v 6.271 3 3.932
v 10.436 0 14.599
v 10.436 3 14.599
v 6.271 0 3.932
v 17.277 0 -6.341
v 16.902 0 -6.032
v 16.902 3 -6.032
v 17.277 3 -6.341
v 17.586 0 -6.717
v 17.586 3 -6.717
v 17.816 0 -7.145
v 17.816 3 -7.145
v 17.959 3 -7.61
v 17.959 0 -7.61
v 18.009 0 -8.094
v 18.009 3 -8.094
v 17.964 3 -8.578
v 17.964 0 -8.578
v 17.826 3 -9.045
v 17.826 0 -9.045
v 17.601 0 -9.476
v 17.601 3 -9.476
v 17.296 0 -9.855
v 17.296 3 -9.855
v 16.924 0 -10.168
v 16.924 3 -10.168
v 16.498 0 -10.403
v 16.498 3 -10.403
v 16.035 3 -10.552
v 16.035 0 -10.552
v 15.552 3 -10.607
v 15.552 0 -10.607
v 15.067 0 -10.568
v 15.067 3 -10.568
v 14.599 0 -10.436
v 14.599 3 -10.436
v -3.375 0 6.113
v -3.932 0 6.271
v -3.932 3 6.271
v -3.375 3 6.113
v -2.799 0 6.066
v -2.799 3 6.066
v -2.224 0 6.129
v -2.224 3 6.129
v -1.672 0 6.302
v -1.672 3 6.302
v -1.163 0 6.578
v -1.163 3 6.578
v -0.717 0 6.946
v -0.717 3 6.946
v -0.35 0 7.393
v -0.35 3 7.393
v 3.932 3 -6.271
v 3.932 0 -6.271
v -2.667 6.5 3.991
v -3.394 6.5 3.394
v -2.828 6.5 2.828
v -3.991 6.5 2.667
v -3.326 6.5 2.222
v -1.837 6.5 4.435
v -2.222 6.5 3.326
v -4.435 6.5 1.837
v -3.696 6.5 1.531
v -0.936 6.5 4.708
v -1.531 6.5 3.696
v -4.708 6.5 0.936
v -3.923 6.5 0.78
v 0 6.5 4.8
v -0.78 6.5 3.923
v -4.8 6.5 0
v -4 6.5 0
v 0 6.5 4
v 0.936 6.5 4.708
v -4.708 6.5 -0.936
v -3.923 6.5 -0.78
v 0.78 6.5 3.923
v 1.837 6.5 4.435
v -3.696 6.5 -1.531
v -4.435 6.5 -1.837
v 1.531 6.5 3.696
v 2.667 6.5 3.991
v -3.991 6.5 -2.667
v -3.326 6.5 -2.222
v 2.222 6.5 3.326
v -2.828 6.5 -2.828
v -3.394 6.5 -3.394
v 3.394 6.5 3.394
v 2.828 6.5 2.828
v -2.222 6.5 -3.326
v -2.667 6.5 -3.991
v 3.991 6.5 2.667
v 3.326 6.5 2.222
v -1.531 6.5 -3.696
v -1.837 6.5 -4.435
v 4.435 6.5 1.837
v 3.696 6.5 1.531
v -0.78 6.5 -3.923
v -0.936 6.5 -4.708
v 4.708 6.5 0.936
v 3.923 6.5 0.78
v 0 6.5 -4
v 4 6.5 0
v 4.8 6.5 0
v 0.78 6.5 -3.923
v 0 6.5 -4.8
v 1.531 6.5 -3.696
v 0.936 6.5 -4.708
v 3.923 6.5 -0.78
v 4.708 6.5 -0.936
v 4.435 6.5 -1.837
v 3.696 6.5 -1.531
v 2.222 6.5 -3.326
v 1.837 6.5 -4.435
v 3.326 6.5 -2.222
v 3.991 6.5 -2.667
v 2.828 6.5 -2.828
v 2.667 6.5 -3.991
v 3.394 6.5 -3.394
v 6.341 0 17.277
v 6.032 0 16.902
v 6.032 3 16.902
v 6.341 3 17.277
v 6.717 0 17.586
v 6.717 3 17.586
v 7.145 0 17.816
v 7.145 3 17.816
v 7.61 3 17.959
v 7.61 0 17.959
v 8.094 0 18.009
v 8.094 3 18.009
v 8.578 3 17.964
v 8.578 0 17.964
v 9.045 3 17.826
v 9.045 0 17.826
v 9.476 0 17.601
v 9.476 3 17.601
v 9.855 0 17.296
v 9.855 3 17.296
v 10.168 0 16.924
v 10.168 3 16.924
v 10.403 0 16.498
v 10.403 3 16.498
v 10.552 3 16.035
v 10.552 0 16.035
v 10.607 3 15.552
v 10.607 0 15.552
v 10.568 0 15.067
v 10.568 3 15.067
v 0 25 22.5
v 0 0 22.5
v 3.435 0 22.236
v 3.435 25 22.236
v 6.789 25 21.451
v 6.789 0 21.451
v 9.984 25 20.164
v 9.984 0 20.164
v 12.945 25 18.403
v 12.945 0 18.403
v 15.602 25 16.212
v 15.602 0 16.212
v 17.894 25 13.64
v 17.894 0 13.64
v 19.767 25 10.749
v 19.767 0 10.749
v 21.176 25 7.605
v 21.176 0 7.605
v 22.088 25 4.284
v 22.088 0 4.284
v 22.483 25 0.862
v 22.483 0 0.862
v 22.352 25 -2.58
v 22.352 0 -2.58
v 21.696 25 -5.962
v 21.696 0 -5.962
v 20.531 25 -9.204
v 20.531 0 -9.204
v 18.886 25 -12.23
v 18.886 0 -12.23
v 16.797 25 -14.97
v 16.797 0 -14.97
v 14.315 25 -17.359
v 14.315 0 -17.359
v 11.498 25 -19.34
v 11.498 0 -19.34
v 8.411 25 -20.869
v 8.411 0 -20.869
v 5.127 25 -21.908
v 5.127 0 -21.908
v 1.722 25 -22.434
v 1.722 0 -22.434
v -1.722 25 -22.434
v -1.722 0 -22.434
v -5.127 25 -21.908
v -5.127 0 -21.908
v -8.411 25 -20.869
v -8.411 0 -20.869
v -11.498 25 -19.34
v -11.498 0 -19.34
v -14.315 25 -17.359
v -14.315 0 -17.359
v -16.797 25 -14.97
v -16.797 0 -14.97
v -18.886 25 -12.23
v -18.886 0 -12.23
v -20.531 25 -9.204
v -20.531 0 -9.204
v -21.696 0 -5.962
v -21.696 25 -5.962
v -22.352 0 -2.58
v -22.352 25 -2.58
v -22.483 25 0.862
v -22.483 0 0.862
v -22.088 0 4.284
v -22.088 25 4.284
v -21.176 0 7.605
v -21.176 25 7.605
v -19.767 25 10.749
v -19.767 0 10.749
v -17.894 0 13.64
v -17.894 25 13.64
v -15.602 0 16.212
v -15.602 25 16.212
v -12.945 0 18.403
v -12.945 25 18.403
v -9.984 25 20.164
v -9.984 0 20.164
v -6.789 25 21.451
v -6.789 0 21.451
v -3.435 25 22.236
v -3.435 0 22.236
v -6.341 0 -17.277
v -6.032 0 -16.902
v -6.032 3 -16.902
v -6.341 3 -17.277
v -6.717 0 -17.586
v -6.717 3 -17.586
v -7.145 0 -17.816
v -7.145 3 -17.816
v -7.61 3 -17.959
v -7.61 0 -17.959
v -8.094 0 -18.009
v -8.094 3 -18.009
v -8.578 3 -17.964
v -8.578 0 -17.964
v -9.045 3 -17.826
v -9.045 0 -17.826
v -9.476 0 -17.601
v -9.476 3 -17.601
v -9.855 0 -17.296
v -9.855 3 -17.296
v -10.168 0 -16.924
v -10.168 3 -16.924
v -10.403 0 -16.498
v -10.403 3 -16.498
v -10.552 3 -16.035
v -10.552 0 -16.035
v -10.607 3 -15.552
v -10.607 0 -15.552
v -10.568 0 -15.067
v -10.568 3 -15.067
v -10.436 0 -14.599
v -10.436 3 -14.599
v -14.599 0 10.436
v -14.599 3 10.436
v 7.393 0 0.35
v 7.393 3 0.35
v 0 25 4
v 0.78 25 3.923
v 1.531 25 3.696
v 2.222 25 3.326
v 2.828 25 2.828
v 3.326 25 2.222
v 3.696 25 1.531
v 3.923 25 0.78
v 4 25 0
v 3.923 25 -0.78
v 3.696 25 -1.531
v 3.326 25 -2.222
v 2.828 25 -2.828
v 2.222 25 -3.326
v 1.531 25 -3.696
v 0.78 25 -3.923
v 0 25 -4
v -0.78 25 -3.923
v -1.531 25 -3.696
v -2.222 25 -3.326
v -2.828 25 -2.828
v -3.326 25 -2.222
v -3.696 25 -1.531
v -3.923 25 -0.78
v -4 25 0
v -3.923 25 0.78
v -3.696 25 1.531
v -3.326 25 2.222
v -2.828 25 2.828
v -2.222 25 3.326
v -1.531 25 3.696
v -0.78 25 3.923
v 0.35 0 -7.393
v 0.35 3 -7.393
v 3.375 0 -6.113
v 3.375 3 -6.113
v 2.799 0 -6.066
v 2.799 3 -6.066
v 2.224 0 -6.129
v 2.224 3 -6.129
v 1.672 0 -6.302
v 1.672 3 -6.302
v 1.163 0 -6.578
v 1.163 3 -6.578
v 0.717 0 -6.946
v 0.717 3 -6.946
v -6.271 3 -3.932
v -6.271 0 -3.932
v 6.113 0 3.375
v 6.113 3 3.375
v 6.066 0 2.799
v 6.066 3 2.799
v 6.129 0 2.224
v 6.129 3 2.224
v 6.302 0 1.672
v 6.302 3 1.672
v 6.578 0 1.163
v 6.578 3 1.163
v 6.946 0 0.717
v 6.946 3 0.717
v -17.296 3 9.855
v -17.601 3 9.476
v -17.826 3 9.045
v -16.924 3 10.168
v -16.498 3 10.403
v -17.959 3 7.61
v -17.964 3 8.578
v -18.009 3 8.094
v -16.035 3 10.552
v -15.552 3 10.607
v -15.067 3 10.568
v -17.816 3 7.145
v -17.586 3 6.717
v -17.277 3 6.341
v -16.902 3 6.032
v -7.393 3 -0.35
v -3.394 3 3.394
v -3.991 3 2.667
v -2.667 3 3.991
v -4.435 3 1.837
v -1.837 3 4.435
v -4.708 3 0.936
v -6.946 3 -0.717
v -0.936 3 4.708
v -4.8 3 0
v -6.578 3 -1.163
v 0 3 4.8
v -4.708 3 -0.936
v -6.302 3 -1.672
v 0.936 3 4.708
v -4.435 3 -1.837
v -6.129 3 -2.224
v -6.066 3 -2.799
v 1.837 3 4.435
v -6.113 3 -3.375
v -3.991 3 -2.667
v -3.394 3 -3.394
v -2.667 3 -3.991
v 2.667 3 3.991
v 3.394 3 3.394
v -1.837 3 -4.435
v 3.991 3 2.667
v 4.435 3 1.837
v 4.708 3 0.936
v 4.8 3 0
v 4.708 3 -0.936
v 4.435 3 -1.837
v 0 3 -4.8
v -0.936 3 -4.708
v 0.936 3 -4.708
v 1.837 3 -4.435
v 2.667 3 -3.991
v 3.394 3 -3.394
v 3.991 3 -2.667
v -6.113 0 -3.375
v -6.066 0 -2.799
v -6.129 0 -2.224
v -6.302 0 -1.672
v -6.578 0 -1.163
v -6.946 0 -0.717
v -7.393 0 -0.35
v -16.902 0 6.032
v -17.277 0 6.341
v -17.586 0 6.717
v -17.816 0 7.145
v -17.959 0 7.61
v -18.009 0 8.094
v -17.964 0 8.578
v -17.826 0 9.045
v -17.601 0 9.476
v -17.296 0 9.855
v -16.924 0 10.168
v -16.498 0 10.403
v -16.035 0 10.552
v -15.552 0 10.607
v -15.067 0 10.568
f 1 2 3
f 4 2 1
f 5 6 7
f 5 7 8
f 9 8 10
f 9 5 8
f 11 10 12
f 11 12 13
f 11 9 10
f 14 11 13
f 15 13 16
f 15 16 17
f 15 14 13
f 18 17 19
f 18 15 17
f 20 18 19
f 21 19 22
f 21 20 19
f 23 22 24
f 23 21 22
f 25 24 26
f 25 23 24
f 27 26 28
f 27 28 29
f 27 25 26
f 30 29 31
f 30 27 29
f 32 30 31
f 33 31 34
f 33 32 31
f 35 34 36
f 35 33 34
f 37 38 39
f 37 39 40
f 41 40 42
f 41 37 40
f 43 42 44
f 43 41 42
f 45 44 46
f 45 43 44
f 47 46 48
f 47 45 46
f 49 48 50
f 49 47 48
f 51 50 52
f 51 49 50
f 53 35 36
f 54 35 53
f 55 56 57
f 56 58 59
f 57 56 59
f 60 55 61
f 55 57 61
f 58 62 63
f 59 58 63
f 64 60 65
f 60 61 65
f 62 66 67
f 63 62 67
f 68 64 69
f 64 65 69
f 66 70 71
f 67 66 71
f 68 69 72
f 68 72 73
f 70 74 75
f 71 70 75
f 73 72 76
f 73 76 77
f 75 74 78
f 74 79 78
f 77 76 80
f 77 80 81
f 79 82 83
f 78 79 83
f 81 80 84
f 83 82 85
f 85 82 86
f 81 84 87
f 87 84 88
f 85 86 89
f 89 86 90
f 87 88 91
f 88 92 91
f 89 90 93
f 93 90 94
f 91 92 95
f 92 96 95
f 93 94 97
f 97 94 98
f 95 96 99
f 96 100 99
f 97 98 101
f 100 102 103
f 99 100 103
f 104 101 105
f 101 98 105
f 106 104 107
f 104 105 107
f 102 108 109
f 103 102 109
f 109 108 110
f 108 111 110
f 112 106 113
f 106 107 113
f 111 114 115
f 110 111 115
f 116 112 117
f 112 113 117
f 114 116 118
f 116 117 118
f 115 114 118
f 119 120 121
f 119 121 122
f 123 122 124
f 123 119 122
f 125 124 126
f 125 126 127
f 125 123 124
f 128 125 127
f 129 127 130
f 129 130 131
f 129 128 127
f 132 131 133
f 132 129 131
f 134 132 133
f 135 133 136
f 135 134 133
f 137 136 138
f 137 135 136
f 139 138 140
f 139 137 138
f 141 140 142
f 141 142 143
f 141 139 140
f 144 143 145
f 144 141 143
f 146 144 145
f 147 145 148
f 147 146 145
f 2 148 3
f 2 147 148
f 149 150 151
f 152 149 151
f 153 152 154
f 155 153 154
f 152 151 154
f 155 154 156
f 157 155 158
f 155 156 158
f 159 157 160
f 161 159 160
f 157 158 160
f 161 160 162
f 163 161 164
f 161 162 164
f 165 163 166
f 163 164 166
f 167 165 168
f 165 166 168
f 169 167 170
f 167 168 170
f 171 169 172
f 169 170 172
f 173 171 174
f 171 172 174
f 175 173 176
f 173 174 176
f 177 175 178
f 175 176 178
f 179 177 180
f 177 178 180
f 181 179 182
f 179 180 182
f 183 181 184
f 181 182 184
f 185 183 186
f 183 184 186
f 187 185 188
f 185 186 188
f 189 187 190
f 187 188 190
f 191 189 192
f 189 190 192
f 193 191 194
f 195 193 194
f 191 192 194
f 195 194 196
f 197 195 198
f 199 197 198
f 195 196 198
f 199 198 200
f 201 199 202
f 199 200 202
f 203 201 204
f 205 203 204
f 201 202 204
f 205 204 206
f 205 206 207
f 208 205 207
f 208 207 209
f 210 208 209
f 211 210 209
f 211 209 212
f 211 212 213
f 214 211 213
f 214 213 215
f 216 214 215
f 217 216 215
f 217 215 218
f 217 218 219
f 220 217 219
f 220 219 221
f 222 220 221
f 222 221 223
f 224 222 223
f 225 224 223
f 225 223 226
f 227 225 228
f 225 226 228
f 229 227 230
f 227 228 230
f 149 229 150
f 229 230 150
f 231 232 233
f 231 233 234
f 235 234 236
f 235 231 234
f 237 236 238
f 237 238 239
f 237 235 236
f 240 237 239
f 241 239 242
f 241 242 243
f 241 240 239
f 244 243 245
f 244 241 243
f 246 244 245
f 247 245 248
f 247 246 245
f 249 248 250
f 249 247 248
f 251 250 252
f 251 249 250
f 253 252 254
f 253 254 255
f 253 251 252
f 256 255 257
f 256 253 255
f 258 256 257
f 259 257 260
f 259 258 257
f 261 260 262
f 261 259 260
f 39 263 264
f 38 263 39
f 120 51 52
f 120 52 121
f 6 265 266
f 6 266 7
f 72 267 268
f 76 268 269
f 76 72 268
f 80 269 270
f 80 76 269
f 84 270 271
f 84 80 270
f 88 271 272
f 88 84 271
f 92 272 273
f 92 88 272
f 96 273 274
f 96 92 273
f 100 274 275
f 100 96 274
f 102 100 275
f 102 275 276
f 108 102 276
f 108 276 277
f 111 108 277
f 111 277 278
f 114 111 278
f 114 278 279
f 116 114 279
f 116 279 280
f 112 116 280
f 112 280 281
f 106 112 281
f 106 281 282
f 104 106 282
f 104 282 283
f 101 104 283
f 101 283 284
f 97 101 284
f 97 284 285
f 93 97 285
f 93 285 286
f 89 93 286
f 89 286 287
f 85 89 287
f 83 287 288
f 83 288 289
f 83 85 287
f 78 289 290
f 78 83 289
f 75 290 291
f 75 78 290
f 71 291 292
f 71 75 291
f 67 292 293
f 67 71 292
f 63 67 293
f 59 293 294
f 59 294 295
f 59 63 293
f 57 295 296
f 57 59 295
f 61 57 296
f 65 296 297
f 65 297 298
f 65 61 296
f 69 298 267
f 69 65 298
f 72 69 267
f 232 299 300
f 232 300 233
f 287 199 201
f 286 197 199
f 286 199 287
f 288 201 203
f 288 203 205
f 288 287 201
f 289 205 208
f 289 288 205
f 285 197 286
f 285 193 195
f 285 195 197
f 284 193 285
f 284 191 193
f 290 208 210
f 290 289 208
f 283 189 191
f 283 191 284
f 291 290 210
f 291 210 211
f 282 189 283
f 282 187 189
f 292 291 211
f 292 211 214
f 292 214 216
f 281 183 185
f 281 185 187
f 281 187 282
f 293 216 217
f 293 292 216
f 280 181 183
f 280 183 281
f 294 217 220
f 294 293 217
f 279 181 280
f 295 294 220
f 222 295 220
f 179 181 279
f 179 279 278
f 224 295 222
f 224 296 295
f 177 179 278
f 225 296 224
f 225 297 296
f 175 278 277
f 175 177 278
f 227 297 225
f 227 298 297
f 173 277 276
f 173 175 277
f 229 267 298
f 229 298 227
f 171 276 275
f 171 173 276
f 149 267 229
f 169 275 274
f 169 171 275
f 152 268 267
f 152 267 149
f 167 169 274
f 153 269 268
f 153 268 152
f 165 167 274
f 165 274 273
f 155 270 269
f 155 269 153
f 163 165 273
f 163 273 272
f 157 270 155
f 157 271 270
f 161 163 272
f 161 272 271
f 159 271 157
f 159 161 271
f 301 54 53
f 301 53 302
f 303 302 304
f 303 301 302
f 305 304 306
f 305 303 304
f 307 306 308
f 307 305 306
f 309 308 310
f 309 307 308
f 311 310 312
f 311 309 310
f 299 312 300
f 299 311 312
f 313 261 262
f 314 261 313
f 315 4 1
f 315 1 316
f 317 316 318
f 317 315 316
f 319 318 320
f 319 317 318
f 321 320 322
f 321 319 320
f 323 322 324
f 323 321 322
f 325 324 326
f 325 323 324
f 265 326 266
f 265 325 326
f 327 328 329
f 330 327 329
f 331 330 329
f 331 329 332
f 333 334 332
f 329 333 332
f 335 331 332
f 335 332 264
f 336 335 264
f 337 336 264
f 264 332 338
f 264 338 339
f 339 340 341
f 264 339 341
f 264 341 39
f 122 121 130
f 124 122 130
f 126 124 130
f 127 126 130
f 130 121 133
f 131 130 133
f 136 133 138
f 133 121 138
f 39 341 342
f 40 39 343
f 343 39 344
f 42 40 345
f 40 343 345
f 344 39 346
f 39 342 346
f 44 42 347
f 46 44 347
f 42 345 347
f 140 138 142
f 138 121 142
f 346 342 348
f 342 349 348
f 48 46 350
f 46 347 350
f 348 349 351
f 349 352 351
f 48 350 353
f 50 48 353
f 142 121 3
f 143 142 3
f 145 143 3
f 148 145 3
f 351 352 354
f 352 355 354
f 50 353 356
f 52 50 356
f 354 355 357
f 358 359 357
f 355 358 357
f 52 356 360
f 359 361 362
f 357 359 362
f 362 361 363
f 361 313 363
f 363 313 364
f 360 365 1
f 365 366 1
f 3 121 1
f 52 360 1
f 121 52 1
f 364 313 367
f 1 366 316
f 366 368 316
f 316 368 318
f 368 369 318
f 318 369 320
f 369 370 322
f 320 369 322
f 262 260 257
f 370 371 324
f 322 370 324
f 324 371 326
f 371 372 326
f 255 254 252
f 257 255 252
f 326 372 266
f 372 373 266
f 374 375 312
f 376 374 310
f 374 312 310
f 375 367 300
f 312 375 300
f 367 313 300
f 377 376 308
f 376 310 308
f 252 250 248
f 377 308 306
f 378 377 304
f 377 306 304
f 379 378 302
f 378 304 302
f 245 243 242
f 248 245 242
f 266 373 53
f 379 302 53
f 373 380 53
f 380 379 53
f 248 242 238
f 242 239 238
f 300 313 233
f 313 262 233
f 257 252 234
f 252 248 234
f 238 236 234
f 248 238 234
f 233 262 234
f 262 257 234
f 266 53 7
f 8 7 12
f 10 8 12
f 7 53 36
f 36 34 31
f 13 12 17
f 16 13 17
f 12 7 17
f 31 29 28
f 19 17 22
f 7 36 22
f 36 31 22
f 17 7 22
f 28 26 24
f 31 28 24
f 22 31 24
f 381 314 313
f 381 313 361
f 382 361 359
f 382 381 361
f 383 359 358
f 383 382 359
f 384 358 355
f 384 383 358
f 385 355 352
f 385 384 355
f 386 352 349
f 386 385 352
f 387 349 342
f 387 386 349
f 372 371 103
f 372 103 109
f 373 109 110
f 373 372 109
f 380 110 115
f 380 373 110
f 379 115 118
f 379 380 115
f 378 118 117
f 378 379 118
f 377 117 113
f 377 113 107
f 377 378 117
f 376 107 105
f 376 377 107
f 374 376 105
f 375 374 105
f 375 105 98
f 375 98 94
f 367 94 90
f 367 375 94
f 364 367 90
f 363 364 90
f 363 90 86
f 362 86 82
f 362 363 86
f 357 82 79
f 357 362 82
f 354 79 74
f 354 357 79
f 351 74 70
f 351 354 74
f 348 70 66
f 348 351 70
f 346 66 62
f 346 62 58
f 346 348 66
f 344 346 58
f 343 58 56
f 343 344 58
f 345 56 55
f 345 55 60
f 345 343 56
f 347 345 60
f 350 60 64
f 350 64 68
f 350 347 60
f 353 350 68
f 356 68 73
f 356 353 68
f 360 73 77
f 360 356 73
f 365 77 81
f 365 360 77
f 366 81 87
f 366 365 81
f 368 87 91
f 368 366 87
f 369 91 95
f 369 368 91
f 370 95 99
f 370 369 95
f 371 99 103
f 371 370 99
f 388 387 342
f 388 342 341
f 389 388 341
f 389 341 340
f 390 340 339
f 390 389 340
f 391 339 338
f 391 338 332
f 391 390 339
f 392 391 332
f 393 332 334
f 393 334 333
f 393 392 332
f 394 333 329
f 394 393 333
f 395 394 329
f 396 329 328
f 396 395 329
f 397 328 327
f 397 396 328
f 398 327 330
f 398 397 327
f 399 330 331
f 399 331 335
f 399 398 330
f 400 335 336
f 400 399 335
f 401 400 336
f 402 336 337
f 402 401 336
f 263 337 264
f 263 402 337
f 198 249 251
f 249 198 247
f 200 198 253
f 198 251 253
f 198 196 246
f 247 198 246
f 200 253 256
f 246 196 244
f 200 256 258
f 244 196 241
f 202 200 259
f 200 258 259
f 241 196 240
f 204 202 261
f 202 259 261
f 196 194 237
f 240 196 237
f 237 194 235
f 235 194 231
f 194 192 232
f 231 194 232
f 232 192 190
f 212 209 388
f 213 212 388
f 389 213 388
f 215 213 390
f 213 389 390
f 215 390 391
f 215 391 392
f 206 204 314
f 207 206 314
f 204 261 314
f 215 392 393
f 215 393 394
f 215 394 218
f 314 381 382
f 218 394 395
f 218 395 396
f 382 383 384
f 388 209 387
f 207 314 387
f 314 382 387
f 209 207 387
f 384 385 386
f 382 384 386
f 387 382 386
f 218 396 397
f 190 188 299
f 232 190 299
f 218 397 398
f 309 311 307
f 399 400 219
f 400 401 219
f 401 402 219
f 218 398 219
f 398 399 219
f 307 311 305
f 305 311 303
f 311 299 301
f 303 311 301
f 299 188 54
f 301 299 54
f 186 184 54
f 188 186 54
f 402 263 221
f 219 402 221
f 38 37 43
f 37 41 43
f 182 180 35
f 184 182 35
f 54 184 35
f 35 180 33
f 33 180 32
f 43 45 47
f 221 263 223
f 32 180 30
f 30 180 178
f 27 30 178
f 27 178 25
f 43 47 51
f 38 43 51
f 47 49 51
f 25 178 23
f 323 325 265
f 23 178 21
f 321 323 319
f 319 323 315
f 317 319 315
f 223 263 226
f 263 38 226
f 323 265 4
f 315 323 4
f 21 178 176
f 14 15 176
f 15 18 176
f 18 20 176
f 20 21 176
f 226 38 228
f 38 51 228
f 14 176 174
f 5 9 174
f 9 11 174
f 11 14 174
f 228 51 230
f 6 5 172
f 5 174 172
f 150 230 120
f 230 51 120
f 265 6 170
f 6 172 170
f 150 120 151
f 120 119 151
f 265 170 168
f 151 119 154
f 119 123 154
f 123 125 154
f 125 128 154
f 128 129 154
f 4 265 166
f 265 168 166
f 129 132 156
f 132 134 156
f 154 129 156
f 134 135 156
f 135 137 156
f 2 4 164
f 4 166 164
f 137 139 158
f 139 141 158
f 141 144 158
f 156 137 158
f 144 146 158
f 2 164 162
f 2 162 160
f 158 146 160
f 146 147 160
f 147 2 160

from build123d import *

# Parameters (mm, degrees)
ESQUISSE1_R              = 22.5
ESQUISSE1_R_2            = 4
BOSS_EXTRU_1_DEPTH       = 25
EMPREINTE2_OUTLINE_R     = 4
EMPREINTE2_DEPTH         = 3
EMPREINTE2_START         = 3
EMPREINTE2_2_OUTLINE_R   = 4.8
EMPREINTE2_2_OUTLINE_R_2 = 4
EMPREINTE2_2_DEPTH       = 3.5


# Read off the part's stored shape, not the designer's step: Empreinte2
with BuildPart() as part:
    # Esquisse1 → Boss.-Extru.1 (new body)
    with BuildSketch(Plane(origin=(0, 0, 0), x_dir=(1, 0, 0), z_dir=(0, 1, 0))):
        with Locations(Location((0, 0, 0), (0, 0, 270))):
            Circle(ESQUISSE1_R)
        with Locations(Location((0, 0, 0), (0, 0, 270))):
            Circle(ESQUISSE1_R_2, mode=Mode.SUBTRACT)
    extrude(amount=BOSS_EXTRU_1_DEPTH)

    # Empreinte2 outline → Empreinte2 (cut)
    with BuildSketch(Plane(origin=(0, 0, 0), x_dir=(1, 0, 0), z_dir=(0, 1, 0))):
        with BuildLine():
            ThreePointArc((16.901774097, 6.031934529), (17.724046015, 9.265969613), (14.599132464, 10.436452132))
            Line((14.599132464, 10.436452132), (3.932151869, 6.270816496))
            ThreePointArc((3.932151869, 6.270816496), (1.943748033, 6.202567499), (0.349915852, 7.393410359))
            Line((0.349915852, 7.393410359), (-6.031934529, 16.901774097))
            ThreePointArc((-6.031934529, 16.901774097), (-9.265969613, 17.724046015), (-10.436452132, 14.599132464))
            Line((-10.436452132, 14.599132464), (-6.270816496, 3.932151869))
            ThreePointArc((-6.270816496, 3.932151869), (-6.202567499, 1.943748033), (-7.393410359, 0.349915852))
            Line((-7.393410359, 0.349915852), (-16.901774097, -6.031934529))
            ThreePointArc((-16.901774097, -6.031934529), (-17.724046015, -9.265969613), (-14.599132464, -10.436452132))
            Line((-14.599132464, -10.436452132), (-3.932151869, -6.270816496))
            ThreePointArc((-3.932151869, -6.270816496), (-1.943748033, -6.202567499), (-0.349915852, -7.393410359))
            Line((-0.349915852, -7.393410359), (6.031934529, -16.901774097))
            ThreePointArc((6.031934529, -16.901774097), (9.265969613, -17.724046015), (10.436452132, -14.599132464))
            Line((10.436452132, -14.599132464), (6.270816496, -3.932151869))
            ThreePointArc((6.270816496, -3.932151869), (6.202567499, -1.943748033), (7.393410359, -0.349915852))
            Line((7.393410359, -0.349915852), (16.901774097, 6.031934529))
        make_face()
        Circle(EMPREINTE2_OUTLINE_R, mode=Mode.SUBTRACT)
    extrude(amount=EMPREINTE2_DEPTH, mode=Mode.SUBTRACT)

    # Empreinte2 2 outline → Empreinte2 2 (cut)
    with BuildSketch(Plane(origin=(0, 0, 0), x_dir=(1, 0, 0), z_dir=(0, 1, 0)).offset(EMPREINTE2_START)):
        Circle(EMPREINTE2_2_OUTLINE_R)
        Circle(EMPREINTE2_2_OUTLINE_R_2, mode=Mode.SUBTRACT)
    extrude(amount=EMPREINTE2_2_DEPTH, mode=Mode.SUBTRACT)


solid = part.part
